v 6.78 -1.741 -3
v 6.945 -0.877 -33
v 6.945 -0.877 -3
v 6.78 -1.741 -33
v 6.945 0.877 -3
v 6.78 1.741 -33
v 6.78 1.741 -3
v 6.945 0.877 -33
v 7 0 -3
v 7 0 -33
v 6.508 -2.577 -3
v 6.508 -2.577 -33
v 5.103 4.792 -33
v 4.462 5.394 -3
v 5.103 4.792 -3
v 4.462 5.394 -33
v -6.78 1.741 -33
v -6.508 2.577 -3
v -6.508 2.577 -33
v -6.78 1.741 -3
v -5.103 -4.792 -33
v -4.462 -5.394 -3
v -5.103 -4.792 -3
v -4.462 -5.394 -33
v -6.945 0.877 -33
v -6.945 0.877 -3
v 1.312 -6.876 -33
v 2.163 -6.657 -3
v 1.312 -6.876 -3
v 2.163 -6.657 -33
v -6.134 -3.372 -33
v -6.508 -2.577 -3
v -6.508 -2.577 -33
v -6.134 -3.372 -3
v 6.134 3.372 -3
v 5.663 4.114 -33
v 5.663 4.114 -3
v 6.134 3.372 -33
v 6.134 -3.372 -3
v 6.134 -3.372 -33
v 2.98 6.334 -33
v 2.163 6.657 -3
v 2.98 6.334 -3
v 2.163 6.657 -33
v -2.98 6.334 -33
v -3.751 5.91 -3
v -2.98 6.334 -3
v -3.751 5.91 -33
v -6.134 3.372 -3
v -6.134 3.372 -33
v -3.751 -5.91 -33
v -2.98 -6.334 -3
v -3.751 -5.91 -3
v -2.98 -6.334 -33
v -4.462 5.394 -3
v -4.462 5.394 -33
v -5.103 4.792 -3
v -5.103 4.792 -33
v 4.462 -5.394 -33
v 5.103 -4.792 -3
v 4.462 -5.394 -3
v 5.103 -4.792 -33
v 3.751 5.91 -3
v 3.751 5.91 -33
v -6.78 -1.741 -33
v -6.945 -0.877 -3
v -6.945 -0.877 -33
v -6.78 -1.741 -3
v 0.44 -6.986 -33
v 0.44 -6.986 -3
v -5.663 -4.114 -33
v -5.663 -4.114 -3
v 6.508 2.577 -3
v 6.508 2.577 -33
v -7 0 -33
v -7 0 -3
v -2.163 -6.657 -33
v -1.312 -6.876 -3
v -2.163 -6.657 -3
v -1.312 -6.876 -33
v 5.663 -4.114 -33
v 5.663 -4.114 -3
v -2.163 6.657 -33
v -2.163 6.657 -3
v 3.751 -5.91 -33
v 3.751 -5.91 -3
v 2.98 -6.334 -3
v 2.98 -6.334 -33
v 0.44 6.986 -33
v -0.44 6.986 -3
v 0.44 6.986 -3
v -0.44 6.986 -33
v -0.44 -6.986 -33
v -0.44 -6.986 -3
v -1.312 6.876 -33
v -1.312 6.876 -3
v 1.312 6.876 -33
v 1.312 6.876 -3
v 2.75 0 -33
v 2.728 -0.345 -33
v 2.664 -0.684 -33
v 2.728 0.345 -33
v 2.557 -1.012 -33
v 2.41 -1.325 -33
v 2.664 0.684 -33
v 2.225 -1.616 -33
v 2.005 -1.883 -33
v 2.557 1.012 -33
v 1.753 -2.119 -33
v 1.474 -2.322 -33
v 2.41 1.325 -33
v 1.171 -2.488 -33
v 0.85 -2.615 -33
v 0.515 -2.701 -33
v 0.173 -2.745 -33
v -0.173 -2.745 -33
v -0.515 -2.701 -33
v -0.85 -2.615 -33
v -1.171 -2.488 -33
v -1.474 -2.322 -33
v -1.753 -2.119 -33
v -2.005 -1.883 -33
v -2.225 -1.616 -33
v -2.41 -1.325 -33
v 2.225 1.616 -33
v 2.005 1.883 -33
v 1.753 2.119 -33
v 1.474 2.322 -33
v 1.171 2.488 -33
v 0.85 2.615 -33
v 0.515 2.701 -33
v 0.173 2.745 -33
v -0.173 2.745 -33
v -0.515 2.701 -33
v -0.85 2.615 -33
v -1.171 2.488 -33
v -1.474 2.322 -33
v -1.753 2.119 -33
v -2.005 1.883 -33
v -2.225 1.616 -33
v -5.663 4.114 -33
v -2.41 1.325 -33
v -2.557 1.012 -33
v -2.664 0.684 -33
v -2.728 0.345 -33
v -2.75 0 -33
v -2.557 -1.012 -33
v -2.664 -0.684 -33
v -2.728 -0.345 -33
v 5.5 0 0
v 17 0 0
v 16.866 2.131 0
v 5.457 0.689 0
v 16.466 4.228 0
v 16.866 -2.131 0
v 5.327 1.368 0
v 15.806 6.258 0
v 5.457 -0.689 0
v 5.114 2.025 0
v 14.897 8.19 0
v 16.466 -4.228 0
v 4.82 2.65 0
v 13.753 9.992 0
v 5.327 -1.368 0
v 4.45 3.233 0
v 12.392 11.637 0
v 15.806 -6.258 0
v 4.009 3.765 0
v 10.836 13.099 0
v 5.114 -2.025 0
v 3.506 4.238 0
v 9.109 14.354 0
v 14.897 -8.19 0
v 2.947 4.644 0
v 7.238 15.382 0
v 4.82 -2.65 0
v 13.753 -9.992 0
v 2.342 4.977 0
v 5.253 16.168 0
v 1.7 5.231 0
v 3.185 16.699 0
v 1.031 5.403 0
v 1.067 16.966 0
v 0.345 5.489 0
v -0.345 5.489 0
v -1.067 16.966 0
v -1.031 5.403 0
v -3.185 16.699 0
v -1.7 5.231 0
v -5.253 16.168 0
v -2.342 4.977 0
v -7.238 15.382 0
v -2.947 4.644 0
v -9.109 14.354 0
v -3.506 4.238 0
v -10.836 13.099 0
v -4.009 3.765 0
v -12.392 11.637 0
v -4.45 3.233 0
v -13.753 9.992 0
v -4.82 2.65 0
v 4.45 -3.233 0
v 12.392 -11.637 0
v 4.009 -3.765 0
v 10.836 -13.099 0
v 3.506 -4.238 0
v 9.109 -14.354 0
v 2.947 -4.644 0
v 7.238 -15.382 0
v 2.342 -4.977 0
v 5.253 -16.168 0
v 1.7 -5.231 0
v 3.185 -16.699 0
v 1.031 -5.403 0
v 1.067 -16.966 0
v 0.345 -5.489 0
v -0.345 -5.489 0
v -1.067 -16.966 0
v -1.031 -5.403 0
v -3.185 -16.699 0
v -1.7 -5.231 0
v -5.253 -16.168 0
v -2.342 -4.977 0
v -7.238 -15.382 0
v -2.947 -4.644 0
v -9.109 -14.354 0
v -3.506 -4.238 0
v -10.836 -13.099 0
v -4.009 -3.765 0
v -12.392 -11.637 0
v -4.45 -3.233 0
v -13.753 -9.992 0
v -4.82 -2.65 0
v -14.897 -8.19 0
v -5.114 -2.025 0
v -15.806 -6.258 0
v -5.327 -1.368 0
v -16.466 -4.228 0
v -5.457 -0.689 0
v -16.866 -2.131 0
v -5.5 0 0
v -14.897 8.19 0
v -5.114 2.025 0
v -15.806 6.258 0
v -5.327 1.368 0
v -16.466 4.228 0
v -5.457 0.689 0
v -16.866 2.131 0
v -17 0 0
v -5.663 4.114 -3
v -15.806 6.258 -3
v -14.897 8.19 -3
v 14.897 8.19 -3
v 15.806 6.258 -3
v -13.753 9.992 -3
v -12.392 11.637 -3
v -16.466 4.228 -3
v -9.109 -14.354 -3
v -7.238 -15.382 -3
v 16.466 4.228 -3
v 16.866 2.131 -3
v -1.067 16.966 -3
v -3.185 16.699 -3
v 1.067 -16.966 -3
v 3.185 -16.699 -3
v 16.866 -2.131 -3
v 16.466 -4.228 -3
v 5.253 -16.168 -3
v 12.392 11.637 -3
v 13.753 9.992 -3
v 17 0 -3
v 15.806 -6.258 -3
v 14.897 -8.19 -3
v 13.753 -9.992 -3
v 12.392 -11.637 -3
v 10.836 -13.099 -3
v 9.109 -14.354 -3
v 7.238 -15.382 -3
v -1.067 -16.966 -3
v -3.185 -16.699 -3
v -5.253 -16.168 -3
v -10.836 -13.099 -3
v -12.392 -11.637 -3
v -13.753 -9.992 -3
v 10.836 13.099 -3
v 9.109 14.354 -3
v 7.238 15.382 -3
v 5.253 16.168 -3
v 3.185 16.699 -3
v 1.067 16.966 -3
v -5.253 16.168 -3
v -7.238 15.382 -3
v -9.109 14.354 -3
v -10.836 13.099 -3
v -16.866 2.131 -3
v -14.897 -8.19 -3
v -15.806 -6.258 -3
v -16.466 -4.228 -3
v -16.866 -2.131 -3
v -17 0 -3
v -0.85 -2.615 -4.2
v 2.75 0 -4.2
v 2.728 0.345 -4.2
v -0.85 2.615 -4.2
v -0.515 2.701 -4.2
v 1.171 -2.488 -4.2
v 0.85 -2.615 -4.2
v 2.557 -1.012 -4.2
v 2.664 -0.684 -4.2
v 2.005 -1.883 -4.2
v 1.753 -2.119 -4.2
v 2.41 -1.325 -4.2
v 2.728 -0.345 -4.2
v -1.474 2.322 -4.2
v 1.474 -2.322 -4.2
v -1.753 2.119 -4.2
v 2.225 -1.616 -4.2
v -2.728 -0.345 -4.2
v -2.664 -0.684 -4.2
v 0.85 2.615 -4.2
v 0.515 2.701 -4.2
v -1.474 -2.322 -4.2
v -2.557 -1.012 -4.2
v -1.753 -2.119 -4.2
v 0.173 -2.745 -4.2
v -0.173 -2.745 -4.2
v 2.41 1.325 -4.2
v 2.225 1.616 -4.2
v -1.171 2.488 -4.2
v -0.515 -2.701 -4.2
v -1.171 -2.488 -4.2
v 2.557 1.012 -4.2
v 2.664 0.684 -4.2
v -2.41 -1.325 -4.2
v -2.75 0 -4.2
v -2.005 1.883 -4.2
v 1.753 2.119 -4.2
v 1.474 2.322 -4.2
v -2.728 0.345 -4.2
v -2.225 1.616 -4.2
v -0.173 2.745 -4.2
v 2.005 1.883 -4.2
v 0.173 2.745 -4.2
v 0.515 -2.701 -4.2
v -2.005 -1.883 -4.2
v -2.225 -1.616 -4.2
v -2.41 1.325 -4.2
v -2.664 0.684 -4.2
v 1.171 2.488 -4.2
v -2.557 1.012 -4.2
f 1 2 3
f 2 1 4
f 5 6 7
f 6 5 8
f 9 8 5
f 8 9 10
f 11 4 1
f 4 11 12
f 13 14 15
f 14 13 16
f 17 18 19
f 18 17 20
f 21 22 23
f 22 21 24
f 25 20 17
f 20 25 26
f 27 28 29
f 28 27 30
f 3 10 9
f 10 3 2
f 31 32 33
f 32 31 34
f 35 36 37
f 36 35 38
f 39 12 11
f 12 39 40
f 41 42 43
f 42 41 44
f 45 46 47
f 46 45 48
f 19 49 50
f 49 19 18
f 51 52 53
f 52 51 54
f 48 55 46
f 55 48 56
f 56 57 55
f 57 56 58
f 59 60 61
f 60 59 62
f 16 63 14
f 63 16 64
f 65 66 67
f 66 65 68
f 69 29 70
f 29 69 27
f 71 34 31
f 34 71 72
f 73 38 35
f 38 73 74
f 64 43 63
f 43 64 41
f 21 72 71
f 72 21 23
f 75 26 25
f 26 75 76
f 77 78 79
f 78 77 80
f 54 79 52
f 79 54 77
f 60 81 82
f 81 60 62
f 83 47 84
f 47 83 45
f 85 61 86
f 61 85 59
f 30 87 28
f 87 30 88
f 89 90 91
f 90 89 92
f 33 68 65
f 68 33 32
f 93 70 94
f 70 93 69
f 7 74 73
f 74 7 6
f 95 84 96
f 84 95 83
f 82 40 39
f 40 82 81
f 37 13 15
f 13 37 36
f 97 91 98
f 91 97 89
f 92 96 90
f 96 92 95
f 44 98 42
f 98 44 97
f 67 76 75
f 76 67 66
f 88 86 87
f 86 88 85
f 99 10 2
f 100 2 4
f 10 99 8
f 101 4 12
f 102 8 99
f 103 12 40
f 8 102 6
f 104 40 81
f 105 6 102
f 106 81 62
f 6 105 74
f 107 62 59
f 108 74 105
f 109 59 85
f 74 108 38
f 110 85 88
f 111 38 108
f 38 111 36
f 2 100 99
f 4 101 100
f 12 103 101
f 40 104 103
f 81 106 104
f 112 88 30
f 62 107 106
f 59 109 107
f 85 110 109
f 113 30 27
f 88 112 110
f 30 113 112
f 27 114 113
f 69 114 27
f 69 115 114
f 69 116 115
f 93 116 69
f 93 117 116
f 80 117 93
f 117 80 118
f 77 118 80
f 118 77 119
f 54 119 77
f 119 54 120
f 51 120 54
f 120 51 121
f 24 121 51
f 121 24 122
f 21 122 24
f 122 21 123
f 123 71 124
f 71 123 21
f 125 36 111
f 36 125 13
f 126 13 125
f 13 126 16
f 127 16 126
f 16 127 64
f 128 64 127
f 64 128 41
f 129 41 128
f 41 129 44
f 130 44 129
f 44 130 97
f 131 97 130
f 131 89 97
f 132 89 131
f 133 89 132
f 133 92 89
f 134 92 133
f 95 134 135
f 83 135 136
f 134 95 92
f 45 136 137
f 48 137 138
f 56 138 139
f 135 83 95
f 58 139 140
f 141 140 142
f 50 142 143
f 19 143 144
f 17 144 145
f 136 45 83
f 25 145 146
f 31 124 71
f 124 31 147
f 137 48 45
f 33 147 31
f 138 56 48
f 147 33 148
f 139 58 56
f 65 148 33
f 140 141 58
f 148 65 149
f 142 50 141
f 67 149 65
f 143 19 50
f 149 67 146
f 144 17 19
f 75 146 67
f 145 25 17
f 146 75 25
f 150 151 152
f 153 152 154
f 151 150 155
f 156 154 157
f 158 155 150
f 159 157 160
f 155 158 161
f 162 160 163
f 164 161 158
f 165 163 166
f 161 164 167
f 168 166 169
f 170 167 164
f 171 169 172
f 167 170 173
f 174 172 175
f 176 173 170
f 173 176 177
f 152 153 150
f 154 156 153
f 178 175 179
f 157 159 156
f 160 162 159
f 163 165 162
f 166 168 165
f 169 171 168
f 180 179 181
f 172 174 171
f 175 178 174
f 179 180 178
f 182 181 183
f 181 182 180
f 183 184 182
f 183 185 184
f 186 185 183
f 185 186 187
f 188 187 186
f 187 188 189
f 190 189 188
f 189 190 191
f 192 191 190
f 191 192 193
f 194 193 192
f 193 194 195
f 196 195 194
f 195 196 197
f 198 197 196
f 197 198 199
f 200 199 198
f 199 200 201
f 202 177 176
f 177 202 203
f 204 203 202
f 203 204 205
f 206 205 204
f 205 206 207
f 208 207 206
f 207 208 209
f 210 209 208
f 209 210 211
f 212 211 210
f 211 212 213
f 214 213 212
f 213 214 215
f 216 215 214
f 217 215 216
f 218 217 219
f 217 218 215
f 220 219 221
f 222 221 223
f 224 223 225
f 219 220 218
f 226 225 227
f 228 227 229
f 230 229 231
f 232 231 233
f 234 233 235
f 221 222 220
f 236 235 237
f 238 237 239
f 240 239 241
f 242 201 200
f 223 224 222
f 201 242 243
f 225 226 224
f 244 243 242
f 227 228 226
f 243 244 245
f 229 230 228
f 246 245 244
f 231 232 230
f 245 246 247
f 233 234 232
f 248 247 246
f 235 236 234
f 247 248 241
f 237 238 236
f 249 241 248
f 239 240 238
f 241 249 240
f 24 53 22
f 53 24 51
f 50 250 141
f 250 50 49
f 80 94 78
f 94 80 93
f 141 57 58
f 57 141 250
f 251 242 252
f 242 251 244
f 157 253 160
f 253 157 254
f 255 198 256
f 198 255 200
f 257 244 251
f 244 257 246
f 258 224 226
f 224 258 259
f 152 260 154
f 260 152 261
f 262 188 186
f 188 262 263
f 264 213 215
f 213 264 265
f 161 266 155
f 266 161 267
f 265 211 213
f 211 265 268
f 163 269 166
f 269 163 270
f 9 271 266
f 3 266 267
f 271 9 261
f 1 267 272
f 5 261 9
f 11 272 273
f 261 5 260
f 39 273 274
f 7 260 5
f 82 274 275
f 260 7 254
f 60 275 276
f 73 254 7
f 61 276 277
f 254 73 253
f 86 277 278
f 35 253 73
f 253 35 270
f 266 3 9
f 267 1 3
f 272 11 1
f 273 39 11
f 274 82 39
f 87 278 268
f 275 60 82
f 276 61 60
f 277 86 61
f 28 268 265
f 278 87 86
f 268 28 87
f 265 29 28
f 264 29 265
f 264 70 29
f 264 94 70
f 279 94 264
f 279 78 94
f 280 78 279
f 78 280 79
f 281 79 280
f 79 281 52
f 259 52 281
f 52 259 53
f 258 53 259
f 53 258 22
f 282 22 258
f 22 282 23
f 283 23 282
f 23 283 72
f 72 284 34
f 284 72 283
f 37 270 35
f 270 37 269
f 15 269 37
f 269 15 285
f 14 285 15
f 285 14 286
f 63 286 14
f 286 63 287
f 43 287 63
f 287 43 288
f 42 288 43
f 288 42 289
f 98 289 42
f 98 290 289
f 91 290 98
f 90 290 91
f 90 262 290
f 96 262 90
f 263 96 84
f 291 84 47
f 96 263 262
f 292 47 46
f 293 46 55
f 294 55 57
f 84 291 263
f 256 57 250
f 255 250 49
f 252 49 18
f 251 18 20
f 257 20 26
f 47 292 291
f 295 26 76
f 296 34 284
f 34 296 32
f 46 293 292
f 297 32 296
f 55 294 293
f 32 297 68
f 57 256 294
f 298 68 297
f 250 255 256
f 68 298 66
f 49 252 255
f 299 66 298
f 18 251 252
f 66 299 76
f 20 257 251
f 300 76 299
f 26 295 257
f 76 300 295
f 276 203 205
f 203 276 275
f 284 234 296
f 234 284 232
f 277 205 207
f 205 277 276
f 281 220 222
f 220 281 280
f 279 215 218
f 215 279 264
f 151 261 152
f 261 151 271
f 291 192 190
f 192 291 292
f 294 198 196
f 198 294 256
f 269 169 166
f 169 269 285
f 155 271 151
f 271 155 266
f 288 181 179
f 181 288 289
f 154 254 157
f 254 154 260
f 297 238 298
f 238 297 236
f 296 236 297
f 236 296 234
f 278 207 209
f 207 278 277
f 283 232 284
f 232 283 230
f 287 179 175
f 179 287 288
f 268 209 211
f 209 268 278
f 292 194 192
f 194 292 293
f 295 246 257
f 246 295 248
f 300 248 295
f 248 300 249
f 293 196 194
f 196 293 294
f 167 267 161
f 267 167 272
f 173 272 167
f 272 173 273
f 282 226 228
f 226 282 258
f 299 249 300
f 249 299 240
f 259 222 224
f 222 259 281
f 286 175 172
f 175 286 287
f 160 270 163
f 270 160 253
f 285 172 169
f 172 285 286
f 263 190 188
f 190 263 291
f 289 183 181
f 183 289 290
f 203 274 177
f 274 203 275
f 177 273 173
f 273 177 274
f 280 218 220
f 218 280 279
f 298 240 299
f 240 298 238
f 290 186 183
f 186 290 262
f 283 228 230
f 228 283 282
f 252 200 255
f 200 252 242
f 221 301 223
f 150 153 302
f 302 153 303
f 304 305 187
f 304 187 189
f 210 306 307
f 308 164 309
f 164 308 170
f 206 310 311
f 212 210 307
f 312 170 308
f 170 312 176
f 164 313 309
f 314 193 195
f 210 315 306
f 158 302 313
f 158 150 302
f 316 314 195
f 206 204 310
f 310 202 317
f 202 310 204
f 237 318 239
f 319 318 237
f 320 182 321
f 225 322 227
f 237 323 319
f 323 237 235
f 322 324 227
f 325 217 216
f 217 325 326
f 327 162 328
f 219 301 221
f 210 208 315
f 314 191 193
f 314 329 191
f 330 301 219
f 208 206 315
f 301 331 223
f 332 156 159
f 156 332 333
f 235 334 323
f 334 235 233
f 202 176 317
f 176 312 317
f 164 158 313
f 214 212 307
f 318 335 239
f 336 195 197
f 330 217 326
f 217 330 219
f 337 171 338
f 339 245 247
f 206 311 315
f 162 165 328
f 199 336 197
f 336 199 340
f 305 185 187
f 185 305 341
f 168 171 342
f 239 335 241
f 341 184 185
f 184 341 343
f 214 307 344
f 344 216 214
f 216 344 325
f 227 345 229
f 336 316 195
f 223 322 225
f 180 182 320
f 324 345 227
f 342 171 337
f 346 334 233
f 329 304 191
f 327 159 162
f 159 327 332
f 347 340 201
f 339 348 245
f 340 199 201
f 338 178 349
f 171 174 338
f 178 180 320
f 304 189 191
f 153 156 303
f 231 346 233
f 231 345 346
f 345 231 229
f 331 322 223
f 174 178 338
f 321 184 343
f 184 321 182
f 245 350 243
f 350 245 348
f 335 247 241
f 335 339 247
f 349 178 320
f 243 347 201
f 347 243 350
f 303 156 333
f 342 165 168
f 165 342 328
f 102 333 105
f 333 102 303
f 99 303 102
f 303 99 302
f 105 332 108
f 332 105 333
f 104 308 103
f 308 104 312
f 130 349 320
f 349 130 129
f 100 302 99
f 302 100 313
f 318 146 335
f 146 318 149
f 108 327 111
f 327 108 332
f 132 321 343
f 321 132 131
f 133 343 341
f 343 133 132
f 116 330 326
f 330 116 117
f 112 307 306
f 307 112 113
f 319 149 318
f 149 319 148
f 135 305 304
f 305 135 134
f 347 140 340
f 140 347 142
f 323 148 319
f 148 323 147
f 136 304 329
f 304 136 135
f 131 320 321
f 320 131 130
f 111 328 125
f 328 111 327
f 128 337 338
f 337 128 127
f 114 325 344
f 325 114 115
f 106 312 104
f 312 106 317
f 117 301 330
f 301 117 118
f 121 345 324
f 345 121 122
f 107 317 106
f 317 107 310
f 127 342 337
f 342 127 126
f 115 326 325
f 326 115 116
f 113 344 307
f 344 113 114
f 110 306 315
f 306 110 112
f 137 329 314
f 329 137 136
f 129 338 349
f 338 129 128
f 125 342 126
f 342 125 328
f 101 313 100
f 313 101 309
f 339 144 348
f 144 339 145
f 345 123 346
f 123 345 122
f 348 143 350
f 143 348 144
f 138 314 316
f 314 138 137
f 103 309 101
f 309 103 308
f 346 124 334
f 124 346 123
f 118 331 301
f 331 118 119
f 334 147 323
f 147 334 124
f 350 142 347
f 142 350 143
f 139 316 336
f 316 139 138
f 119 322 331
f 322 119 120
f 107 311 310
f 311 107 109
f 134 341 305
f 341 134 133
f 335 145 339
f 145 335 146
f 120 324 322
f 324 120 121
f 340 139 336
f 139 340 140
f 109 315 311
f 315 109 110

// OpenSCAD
$fn = 50;


difference() {
	union() {
		translate(v = [0, 0, -33.0000000000]) {
			cylinder(h = 33, r = 7.0000000000);
		}
		translate(v = [0, 0, -3.0000000000]) {
			cylinder(h = 3, r = 17.0000000000);
		}
	}
	union() {
		translate(v = [0, 0, 0]) {
			rotate(a = [0, 0, 0]) {
				difference() {
					union() {
						#translate(v = [0, 0, -33.0000000000]) {
							cylinder(h = 33, r = 2.2500000000);
						}
						#translate(v = [0, 0, -4.2000000000]) {
							cylinder(h = 4.2000000000, r1 = 2.7500000000, r2 = 5.5000000000);
						}
						#translate(v = [0, 0, -33.0000000000]) {
							cylinder(h = 33, r = 2.7500000000);
						}
						#translate(v = [0, 0, -33.0000000000]) {
							cylinder(h = 33, r = 2.2500000000);
						}
					}
					union();
				}
			}
		}
	}
}
